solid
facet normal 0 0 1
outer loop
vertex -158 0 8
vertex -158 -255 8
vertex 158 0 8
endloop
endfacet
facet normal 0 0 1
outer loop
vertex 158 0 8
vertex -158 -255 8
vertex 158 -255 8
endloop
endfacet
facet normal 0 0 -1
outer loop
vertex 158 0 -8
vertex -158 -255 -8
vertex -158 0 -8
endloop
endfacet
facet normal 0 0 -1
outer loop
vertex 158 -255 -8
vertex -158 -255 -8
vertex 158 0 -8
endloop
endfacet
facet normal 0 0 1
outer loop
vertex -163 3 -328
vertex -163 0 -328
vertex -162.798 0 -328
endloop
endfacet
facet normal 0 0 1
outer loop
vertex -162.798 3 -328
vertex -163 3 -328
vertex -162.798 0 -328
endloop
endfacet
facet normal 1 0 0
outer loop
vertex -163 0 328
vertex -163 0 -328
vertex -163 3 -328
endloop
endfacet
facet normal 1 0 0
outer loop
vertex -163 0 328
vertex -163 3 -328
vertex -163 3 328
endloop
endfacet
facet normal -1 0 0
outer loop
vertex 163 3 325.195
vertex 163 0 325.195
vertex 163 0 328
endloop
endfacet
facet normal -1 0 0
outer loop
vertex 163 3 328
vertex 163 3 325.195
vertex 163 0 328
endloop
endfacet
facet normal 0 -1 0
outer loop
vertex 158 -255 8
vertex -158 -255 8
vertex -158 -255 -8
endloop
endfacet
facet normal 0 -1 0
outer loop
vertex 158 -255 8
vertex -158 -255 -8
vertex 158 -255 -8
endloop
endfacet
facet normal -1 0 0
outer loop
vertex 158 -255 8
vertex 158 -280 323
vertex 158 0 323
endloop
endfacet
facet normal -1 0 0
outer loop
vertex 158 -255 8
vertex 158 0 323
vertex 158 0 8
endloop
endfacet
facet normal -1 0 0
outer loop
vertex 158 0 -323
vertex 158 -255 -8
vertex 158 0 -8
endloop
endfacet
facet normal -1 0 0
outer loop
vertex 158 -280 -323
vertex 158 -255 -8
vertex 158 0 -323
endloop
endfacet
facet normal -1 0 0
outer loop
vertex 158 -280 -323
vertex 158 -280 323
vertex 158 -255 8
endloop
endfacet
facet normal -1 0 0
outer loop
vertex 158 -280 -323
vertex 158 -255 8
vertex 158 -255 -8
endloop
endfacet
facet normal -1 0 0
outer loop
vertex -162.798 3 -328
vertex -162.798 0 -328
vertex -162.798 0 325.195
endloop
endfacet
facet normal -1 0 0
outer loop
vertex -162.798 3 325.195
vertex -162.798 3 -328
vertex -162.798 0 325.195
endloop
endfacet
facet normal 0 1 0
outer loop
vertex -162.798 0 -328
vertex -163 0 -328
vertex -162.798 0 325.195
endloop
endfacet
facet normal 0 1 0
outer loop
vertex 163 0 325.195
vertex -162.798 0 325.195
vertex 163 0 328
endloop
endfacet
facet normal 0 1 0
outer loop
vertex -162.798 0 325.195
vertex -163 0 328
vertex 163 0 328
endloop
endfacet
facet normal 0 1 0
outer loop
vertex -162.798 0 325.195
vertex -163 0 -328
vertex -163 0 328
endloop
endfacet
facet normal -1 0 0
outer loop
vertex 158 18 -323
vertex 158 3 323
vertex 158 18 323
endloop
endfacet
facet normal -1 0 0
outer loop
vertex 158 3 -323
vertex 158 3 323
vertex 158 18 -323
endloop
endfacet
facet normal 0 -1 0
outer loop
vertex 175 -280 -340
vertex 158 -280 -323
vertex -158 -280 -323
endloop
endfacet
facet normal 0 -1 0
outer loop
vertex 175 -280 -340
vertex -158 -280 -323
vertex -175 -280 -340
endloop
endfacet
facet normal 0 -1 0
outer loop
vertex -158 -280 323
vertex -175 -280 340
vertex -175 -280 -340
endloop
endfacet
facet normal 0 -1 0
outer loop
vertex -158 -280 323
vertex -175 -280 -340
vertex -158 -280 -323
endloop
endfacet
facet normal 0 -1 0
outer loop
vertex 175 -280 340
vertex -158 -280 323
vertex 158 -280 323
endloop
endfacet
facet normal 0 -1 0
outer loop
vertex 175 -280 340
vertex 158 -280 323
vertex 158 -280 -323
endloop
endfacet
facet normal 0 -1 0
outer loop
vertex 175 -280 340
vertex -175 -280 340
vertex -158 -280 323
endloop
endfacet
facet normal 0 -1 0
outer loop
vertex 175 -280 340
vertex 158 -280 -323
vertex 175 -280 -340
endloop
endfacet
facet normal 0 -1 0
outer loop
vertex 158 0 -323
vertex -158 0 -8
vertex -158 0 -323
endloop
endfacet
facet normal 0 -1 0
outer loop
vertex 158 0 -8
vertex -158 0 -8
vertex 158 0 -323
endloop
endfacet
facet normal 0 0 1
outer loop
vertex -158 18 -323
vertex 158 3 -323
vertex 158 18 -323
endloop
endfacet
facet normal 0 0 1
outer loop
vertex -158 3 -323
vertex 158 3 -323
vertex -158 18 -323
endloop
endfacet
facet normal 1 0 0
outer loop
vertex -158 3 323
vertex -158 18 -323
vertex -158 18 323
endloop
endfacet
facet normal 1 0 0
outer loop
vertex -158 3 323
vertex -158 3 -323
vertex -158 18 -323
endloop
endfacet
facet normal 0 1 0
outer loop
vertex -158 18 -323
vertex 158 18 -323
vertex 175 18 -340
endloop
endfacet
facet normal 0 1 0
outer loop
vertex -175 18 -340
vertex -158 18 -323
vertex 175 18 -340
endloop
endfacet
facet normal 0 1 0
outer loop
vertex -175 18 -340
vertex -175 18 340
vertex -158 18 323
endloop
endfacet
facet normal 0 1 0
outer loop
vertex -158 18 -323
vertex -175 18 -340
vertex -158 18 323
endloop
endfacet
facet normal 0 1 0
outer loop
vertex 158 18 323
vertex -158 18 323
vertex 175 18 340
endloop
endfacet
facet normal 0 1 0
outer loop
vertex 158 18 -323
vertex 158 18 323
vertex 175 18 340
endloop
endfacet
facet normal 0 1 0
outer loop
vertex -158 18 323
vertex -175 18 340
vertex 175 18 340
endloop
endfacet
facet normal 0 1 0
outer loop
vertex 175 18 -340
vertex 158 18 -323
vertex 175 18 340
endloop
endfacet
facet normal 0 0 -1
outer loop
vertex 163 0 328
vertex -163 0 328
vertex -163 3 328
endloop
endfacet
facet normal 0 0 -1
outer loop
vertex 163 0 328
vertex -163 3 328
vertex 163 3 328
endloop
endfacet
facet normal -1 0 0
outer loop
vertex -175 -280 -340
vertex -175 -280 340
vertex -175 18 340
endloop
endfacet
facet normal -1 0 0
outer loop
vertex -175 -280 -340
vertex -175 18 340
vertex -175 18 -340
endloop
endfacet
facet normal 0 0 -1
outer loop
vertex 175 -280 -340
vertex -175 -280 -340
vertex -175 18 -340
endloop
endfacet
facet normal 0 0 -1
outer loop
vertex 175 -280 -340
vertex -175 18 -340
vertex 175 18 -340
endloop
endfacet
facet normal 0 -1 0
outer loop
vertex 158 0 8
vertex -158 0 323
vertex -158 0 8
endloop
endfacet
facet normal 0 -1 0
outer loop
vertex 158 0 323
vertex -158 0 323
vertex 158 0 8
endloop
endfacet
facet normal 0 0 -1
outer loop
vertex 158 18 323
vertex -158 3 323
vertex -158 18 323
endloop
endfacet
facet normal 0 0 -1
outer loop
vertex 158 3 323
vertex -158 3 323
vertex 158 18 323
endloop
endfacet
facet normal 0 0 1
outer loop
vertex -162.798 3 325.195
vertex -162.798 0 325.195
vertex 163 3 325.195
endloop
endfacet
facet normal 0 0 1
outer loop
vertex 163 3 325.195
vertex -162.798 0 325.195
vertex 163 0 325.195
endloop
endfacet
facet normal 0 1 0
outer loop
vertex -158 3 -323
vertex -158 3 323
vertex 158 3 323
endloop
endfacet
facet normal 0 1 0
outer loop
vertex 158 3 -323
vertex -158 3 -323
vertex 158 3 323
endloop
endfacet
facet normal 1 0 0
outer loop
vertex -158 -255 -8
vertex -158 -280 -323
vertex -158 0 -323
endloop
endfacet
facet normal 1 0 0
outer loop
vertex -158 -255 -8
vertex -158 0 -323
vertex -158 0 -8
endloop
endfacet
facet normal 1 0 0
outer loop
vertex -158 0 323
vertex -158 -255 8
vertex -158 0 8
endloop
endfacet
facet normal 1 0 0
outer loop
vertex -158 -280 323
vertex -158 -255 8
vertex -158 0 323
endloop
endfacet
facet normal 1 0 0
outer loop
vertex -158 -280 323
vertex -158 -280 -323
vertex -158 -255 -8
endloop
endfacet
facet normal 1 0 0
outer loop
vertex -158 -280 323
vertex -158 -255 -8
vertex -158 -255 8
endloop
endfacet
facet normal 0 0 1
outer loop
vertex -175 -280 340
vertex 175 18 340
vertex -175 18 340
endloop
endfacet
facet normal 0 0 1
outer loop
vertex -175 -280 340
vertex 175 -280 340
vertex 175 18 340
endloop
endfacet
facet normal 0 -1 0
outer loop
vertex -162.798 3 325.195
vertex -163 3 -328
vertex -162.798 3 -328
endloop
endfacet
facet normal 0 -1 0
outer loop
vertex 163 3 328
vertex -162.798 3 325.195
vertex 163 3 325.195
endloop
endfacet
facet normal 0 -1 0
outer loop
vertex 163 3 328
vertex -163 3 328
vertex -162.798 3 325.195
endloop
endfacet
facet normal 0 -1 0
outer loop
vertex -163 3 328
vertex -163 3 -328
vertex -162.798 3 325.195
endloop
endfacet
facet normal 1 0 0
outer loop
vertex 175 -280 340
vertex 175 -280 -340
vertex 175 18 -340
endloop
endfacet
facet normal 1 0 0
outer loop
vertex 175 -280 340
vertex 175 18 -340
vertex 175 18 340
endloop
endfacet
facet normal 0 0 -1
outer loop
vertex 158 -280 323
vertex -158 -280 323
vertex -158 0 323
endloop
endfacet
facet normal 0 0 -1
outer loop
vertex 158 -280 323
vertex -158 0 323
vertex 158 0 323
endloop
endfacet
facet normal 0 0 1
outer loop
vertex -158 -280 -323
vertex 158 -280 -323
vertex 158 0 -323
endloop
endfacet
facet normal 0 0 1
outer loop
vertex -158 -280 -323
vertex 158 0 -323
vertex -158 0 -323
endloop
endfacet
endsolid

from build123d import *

# Parameters (mm, degrees)
F0_W          = 316
F0_H          = 16
F1_DEPTH      = 280
F1_DEPTH_BACK = 18
F2_W          = 316
F2_H          = 25
F3_DEPTH      = 16
F4_W          = 316
F4_H          = 18
F5_DEPTH      = 16
F6_W          = 326
F6_H          = 656
F7_DEPTH      = 3
F8_W          = 326
F8_H          = 656
F9_DEPTH      = 3


with BuildPart() as f1:
    # F0 (on Front) → F1 (new body, two sides)
    with BuildSketch(Plane.XZ) as f1_sk:
        Polygon((0, 340), (-175, 340), (-158, 323), (0, 323), (158, 323), (175, 340), align=None)
        Polygon((-158, -323), (-175, -340), (0, -340), (175, -340), (158, -323), (0, -323), align=None)
        Polygon((-158, 323), (-175, 340), (-175, -340), (-158, -323), (-158, -8), (-158, 8), align=None)
        Polygon((175, -340), (175, 340), (158, 323), (158, 8), (158, -8), (158, -323), align=None)
        Rectangle(F0_W, F0_H)
    extrude(amount=F1_DEPTH)
    extrude(f1_sk.sketch, amount=-F1_DEPTH_BACK)

    # F2 (on face) → F3 (cut)
    with BuildSketch(Plane.XY.offset(8)):
        with Locations((0, -267.5)):
            Rectangle(F2_W, F2_H)
    extrude(amount=-F3_DEPTH, mode=Mode.SUBTRACT)

    # F4 (on face) → F5 (cut)
    with BuildSketch(Plane(origin=(0, 0, -8), x_dir=(1, 0, 0), z_dir=(0, 0, -1))):
        with Locations((0, -9)):
            Rectangle(F4_W, F4_H)
    extrude(amount=-F5_DEPTH, mode=Mode.SUBTRACT)

    # F6 (on Front) → F7 (cut)
    with BuildSketch(Plane.XZ):
        Rectangle(F6_W, F6_H)
    extrude(amount=-F7_DEPTH, mode=Mode.SUBTRACT)

    # F8 (on Front) → F9 (join)
    with BuildSketch(Plane.XZ):
        with Locations((0.202316, -2.805007)):
            Rectangle(F8_W, F8_H)
    extrude(amount=-F9_DEPTH)


solid = f1.part
